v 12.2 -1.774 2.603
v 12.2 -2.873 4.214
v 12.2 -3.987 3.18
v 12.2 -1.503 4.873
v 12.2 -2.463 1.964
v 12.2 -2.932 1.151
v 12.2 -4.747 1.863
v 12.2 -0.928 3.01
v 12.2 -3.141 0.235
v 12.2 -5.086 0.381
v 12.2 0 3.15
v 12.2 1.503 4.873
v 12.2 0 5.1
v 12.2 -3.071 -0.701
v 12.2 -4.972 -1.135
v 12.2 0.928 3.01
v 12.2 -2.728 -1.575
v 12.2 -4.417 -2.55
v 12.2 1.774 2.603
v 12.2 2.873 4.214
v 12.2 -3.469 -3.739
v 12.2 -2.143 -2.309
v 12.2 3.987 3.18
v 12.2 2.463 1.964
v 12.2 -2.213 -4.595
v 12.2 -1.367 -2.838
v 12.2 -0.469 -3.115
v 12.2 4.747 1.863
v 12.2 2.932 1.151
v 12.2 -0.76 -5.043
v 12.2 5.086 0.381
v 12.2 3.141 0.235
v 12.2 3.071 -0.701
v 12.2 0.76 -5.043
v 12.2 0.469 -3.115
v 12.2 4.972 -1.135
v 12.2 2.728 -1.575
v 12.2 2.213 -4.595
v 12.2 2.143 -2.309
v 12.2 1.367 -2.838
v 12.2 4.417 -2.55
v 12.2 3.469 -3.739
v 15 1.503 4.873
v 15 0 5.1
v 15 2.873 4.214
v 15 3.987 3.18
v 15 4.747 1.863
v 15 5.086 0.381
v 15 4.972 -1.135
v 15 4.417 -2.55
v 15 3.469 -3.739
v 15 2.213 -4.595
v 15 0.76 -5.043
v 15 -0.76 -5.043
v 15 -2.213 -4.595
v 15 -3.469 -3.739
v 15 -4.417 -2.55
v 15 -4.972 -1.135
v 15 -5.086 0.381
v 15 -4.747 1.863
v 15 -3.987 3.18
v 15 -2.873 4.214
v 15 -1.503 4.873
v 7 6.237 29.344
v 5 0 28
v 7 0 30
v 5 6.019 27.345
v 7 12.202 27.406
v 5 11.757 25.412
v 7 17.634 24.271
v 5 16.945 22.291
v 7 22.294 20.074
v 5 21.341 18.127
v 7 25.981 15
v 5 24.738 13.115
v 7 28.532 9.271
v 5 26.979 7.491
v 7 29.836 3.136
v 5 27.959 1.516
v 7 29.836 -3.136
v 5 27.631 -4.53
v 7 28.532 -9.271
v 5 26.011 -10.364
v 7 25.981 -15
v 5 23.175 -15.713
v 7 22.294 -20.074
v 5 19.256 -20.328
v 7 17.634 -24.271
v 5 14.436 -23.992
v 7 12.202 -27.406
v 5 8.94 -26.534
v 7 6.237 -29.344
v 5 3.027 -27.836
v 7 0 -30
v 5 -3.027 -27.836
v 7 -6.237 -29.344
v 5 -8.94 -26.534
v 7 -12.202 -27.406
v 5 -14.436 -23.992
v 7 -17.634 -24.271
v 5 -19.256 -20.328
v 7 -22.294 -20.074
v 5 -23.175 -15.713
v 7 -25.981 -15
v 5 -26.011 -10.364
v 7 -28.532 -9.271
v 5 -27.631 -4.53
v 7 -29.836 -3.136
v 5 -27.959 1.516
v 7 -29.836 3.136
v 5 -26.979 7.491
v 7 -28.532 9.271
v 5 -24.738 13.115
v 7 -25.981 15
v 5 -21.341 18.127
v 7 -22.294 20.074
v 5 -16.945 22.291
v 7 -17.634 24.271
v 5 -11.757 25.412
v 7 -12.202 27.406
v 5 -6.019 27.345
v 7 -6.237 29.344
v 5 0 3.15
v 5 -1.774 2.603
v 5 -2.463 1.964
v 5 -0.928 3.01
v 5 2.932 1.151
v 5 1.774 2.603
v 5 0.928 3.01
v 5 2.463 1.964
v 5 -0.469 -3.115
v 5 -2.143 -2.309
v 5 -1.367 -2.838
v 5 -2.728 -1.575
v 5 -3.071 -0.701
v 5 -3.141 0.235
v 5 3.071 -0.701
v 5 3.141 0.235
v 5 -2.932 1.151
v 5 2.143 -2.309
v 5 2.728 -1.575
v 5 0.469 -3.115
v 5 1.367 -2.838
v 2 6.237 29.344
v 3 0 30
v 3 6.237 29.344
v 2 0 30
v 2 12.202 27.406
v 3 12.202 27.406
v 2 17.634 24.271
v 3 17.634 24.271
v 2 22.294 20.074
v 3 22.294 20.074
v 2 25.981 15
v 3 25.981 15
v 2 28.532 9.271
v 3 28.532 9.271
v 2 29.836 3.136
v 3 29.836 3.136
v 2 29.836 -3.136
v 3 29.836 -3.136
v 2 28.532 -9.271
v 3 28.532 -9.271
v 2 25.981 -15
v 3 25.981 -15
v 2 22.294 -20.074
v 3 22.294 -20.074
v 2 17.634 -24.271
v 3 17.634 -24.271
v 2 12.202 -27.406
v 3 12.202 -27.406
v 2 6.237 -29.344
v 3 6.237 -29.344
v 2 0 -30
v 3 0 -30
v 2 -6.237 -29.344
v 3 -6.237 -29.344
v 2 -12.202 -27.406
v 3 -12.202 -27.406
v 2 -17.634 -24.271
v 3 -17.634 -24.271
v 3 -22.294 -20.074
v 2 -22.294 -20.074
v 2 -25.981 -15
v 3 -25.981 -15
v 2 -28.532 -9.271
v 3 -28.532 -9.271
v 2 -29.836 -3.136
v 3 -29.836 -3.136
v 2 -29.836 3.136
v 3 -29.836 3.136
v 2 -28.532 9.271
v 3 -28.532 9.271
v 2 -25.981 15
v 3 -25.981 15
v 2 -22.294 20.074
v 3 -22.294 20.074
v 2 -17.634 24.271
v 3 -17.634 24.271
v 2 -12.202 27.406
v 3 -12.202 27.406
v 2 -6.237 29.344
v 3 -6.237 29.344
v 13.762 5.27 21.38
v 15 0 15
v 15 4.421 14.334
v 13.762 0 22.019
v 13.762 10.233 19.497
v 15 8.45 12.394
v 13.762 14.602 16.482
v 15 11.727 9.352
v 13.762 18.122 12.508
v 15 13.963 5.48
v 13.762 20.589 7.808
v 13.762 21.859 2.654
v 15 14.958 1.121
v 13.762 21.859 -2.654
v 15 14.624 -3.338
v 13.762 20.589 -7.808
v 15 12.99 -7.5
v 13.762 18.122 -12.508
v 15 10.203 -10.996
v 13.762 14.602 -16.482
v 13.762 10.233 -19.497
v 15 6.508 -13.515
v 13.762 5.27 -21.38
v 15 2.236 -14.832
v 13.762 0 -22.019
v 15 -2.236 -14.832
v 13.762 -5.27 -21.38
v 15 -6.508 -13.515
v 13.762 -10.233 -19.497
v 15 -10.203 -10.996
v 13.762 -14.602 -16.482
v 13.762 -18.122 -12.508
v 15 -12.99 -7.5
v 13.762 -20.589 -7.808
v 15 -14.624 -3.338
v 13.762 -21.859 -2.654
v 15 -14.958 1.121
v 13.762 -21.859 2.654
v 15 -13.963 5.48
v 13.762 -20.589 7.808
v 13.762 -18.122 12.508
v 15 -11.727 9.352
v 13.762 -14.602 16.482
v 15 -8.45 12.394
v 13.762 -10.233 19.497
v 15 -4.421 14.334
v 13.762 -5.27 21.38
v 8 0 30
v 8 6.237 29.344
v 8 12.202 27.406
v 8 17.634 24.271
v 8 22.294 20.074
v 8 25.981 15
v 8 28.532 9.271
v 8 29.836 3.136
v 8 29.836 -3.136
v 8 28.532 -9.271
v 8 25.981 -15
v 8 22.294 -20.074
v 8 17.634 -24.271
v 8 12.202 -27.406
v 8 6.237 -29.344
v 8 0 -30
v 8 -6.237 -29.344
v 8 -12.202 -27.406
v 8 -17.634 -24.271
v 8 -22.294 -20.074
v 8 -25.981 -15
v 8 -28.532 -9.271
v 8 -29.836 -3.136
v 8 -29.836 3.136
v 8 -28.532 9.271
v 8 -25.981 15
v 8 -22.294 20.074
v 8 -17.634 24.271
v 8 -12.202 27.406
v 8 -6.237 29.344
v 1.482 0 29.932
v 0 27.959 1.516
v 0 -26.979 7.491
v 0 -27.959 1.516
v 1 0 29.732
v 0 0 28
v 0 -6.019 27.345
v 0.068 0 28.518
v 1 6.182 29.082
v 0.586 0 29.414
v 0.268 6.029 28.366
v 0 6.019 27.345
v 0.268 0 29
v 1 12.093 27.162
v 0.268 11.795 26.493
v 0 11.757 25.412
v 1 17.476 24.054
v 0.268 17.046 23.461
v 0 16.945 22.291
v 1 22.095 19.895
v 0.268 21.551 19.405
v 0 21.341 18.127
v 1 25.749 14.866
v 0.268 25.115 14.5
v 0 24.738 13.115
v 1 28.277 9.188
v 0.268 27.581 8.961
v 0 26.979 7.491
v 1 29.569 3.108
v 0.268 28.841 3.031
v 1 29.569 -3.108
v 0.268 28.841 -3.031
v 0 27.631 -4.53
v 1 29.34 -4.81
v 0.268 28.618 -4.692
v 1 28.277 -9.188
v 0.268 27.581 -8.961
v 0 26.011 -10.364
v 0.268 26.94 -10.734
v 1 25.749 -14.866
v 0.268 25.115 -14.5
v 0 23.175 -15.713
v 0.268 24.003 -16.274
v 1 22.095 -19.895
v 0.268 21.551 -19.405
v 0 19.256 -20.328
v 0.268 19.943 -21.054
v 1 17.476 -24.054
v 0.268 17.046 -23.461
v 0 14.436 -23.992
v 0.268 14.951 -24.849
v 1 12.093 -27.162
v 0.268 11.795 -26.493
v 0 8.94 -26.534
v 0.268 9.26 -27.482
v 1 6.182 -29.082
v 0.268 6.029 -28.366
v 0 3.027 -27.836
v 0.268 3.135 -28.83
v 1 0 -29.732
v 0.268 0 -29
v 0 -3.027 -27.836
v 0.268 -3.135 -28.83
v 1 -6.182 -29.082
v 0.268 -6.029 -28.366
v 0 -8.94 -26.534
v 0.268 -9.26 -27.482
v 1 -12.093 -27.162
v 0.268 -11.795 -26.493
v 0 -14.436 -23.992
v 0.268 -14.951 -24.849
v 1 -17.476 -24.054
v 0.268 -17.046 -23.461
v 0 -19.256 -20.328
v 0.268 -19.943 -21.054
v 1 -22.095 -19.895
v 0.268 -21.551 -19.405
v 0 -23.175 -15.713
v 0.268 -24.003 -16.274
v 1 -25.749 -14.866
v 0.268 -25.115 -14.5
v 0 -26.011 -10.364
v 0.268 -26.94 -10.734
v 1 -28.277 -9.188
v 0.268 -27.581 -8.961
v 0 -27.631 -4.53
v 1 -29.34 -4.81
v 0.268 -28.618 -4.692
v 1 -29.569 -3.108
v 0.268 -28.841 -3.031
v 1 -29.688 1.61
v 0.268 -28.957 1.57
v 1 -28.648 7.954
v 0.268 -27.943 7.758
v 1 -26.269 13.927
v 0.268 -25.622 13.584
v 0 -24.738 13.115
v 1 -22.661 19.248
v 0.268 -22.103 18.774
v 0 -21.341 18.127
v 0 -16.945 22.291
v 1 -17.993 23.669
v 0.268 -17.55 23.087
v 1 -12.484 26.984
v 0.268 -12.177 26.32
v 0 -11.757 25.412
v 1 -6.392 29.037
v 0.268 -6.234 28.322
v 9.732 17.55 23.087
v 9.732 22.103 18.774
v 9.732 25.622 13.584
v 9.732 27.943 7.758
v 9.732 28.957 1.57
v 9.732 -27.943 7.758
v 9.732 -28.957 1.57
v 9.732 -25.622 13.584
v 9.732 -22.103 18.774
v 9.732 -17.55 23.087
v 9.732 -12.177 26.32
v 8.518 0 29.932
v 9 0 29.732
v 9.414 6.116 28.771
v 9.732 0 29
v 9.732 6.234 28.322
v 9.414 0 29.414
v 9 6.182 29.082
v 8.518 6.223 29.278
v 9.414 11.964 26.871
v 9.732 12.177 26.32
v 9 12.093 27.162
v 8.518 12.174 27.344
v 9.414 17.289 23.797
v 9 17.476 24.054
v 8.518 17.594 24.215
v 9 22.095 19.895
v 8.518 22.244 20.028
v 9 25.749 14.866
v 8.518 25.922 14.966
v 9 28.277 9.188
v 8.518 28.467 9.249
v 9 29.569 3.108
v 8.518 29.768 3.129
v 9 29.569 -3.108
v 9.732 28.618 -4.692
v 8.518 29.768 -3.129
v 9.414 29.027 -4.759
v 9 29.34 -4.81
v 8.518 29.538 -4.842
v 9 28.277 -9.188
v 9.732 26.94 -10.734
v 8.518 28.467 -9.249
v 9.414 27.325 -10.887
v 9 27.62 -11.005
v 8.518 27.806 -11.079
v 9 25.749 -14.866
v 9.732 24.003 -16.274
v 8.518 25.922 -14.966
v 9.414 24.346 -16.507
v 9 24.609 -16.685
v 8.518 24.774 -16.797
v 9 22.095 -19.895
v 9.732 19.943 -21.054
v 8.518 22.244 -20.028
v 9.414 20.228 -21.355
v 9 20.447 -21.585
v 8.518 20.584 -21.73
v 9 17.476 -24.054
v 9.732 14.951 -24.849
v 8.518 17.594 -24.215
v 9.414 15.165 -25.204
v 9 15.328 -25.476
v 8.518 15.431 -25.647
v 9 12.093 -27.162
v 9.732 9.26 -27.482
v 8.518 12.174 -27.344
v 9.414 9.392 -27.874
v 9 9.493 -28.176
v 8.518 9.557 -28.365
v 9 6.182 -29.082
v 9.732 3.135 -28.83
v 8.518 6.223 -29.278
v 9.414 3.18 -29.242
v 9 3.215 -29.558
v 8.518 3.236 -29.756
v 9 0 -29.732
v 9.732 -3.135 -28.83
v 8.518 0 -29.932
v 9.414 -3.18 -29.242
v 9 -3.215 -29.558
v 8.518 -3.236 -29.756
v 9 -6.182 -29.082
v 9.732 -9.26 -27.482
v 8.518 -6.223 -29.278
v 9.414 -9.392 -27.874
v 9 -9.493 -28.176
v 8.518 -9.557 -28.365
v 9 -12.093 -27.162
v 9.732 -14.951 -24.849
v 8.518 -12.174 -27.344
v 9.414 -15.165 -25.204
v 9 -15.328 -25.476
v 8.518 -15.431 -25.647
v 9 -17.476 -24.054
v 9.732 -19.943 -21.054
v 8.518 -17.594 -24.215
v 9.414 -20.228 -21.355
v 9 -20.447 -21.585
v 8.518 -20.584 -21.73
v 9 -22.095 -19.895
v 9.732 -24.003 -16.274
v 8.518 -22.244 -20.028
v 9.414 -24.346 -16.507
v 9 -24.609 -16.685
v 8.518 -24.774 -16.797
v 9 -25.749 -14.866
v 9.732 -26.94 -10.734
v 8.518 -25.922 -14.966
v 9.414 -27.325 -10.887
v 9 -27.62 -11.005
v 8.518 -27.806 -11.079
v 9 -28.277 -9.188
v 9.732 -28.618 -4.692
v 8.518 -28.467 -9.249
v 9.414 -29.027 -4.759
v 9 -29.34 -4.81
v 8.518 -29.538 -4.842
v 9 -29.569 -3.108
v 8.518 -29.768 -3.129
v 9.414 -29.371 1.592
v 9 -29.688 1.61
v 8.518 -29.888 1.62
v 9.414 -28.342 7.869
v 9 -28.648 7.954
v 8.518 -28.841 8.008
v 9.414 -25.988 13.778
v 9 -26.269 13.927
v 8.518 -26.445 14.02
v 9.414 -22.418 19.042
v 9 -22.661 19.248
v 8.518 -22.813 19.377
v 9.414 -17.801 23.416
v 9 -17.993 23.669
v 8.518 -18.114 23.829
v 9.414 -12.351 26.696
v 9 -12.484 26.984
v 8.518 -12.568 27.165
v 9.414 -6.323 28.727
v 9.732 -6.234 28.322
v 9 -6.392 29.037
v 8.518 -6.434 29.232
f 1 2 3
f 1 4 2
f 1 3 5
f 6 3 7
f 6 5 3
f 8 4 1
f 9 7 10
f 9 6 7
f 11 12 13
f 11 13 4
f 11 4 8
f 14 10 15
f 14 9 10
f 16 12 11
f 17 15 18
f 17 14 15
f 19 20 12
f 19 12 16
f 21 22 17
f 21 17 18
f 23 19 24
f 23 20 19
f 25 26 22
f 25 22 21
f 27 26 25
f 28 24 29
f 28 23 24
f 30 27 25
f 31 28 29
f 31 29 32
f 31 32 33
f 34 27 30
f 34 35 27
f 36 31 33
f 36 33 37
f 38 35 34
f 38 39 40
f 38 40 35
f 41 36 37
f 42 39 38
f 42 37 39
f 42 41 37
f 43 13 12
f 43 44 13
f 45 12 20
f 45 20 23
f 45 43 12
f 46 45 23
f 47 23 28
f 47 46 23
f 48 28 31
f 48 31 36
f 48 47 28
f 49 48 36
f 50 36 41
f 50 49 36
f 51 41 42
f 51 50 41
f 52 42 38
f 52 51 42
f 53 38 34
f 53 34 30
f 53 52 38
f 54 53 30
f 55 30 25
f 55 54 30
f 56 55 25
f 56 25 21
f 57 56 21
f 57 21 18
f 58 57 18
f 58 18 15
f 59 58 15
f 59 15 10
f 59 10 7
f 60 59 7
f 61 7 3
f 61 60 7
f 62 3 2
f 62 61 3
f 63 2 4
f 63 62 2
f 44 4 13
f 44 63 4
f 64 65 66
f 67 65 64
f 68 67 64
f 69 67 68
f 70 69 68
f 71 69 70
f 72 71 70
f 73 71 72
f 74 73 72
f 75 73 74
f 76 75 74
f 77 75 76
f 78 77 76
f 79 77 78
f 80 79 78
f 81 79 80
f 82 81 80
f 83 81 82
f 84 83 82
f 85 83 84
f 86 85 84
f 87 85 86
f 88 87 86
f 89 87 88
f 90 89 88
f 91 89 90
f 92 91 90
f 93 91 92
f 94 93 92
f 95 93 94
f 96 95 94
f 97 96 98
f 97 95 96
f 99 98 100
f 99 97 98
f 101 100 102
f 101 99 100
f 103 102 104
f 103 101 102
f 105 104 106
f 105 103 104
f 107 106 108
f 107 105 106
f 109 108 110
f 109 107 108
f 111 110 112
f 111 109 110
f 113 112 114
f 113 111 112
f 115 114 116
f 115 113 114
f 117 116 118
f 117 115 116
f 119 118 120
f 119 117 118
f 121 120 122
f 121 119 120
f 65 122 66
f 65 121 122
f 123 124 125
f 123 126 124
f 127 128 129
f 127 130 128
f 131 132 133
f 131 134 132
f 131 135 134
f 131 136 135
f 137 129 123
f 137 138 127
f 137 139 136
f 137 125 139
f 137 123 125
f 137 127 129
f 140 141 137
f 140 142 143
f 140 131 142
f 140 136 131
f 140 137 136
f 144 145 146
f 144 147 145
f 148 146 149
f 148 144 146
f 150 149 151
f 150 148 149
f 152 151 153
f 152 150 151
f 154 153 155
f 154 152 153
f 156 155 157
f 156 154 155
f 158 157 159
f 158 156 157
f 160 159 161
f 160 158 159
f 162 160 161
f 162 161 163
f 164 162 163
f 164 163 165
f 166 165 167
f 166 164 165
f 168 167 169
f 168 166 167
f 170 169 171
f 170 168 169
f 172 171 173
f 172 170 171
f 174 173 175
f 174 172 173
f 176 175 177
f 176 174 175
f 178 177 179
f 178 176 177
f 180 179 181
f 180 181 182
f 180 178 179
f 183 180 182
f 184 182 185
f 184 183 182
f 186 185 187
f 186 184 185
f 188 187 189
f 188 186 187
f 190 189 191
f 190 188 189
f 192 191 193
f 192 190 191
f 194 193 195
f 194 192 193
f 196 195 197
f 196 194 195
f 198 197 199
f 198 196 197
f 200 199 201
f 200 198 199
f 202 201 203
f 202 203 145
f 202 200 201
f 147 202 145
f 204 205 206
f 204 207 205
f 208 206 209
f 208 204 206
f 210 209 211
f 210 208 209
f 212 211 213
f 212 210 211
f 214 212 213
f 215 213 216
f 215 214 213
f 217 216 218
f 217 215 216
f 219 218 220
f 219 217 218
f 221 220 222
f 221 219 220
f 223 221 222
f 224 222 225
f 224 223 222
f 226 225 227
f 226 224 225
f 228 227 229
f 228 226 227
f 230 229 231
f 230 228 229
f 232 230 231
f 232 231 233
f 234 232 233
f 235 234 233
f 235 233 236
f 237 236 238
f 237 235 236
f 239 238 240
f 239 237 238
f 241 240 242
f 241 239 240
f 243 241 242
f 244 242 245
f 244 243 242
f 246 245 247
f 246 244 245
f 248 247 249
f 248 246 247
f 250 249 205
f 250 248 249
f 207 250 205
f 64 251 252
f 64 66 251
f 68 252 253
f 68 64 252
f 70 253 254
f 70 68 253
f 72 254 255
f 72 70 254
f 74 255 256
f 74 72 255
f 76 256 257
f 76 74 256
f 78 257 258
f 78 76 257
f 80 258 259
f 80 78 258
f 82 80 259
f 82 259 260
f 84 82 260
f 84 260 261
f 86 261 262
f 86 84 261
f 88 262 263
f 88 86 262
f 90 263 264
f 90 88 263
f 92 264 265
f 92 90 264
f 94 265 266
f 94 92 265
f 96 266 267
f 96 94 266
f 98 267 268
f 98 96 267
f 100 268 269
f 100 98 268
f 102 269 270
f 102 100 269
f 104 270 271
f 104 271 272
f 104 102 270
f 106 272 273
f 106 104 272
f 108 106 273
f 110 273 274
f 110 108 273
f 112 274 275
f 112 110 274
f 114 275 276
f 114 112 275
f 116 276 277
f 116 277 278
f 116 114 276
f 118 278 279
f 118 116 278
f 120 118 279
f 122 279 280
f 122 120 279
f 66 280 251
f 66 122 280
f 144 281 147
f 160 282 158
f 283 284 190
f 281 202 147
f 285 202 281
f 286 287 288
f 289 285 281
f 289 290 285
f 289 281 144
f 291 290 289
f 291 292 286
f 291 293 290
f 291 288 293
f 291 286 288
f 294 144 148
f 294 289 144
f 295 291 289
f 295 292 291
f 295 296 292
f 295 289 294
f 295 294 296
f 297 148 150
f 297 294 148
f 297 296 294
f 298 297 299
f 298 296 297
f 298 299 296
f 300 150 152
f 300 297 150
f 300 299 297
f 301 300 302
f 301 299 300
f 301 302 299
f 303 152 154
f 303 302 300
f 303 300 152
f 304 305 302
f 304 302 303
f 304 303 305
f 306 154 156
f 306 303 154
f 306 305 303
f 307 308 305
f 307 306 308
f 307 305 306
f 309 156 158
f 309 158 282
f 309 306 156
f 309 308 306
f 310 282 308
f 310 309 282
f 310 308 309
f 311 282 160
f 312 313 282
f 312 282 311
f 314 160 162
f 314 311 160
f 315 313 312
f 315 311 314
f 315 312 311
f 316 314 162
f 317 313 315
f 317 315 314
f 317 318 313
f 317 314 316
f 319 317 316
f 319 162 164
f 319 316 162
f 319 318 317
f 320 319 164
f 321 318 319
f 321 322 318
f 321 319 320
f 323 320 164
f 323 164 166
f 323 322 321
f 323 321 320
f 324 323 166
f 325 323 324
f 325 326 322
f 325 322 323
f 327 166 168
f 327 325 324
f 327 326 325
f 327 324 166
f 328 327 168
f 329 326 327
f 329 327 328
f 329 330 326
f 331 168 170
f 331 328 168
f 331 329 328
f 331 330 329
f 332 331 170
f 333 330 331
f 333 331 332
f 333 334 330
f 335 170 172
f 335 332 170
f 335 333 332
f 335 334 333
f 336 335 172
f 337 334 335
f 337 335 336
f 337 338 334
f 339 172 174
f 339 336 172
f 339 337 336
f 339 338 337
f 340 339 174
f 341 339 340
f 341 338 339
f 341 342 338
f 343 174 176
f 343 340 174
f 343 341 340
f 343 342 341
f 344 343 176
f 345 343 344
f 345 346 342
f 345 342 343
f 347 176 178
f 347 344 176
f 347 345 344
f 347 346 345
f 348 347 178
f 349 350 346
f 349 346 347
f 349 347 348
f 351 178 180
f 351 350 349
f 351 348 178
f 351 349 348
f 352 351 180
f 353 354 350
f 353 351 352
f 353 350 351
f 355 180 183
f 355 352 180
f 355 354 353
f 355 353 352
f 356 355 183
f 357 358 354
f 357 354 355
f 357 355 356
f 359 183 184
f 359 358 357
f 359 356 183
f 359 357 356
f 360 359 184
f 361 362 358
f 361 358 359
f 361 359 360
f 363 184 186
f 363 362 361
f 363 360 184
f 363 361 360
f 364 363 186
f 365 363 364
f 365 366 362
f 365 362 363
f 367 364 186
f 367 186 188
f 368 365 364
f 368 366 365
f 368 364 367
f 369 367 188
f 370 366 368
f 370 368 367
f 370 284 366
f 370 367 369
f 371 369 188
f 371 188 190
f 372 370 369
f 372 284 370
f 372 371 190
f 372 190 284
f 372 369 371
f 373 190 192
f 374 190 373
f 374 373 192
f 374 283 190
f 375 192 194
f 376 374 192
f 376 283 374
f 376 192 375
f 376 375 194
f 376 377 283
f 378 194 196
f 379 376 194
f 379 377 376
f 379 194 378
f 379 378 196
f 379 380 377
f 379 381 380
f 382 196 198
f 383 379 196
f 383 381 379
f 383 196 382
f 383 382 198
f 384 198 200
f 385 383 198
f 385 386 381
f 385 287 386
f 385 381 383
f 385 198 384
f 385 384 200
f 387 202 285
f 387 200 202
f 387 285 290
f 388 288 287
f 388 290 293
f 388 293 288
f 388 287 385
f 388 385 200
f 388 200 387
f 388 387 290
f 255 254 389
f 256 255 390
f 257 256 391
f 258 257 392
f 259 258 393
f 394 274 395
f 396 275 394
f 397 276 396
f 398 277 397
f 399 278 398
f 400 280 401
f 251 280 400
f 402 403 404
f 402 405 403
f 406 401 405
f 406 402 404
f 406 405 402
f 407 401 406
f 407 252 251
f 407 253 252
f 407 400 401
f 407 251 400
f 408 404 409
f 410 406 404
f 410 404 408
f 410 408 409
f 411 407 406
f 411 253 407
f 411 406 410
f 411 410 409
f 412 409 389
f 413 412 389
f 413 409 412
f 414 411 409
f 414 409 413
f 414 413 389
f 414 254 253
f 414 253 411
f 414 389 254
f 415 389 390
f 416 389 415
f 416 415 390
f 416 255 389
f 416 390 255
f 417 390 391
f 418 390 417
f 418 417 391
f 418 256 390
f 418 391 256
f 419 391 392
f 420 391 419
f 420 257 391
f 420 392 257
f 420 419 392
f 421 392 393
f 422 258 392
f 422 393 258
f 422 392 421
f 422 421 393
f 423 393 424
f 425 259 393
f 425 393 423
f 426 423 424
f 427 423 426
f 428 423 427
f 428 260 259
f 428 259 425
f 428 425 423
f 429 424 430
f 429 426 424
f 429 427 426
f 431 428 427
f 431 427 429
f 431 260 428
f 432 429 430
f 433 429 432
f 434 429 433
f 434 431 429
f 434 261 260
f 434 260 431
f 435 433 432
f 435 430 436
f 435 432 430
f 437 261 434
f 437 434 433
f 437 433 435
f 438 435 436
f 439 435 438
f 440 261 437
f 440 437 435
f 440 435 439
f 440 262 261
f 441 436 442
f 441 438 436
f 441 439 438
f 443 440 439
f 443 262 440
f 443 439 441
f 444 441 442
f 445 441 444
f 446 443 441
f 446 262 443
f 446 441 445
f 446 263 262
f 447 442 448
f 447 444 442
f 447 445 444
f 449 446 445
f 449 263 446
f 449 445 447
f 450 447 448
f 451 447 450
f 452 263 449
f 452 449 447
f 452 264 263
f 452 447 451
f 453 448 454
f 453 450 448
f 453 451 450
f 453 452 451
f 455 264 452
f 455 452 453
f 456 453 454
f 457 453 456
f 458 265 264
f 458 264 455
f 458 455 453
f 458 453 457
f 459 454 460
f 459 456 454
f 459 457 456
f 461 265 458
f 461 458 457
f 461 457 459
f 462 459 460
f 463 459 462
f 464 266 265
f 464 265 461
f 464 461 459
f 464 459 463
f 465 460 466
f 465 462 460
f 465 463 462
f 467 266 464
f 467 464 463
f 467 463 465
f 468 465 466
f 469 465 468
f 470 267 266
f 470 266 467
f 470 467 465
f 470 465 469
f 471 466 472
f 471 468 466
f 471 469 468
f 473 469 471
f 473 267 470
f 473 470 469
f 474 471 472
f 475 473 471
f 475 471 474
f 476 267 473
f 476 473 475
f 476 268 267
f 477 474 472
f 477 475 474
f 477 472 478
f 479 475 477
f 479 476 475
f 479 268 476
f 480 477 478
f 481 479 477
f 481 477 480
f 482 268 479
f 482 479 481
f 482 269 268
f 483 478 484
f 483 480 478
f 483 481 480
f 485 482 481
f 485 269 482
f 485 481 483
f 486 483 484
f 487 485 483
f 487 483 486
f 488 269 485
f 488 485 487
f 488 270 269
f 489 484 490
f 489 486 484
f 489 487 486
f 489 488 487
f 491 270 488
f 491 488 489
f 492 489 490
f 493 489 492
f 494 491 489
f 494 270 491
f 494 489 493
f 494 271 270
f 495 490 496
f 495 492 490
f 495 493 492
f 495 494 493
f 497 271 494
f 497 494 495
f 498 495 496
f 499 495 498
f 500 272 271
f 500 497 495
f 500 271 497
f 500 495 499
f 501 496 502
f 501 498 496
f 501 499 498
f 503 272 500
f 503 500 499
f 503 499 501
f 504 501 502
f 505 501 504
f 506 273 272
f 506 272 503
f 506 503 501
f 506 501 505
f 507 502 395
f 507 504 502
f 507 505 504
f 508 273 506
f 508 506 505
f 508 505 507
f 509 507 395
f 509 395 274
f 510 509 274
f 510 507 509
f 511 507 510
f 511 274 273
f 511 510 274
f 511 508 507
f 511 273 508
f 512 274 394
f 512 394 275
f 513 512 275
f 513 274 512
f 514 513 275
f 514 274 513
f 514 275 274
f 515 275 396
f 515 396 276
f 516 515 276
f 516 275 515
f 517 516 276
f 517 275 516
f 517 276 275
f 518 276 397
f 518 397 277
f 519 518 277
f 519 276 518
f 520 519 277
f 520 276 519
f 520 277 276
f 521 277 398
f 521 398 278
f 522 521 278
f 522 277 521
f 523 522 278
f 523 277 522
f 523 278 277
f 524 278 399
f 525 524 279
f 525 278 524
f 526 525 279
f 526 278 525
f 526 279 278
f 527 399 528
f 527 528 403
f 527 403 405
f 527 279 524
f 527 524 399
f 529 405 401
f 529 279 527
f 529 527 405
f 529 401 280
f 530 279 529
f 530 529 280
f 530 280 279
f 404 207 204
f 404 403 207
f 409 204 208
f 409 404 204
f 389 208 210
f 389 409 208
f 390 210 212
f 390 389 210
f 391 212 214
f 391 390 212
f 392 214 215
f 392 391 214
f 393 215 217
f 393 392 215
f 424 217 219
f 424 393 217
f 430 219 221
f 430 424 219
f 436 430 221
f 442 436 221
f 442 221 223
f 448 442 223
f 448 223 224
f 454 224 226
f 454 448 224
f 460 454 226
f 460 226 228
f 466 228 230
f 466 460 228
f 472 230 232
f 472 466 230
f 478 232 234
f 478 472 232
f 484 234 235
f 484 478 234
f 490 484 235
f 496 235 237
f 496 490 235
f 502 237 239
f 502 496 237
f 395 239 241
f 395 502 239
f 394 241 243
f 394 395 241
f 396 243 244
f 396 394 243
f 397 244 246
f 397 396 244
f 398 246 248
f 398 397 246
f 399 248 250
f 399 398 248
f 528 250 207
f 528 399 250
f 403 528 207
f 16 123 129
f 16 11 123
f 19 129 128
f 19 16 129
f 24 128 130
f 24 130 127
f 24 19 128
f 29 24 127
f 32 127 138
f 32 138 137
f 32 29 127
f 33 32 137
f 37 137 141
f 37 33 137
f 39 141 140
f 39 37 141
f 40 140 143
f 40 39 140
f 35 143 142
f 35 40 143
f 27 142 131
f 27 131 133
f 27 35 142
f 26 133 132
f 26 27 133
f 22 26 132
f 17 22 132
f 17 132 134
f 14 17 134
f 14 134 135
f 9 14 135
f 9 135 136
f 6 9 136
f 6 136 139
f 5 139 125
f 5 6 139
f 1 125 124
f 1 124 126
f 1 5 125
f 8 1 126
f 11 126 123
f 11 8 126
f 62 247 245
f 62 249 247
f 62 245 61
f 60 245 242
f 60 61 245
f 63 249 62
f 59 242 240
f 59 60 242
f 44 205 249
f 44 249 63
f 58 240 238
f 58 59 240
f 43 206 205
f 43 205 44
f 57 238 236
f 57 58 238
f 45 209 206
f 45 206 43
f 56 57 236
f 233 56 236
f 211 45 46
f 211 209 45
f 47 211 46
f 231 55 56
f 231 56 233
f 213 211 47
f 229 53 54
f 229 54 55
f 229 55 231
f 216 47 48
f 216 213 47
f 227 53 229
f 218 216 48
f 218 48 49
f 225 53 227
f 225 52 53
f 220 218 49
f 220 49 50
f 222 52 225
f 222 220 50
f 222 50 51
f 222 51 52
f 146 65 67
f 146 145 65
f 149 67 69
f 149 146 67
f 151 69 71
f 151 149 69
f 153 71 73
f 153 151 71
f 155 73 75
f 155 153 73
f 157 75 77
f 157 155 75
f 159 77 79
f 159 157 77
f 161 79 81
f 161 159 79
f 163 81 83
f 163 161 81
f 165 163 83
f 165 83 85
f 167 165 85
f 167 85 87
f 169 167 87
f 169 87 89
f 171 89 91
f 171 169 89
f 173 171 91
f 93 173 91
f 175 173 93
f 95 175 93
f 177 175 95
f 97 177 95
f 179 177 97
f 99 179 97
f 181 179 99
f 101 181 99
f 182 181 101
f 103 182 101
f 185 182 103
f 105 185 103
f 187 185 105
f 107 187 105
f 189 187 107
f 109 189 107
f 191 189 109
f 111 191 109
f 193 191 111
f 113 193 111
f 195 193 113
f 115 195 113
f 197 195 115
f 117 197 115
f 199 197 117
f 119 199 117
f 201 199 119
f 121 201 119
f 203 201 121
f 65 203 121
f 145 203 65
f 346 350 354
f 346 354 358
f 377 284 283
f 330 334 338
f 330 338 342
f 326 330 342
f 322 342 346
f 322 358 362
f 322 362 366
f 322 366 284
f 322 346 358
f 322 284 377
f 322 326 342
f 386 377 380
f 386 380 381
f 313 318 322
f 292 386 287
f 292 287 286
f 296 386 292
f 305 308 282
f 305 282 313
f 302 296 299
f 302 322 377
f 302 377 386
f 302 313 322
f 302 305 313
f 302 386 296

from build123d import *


with BuildPart() as f1:
    # F0 (on Front) → F1 (revolve)
    with BuildSketch(Plane.XZ):
        with BuildLine():
            Line((0, 28), (0, 0))
            Line((0, 0), (5, 0))
            Line((5, 0), (5, 3.15))
            Line((5, 3.15), (12.2, 3.15))
            Line((12.2, 3.15), (12.2, 5.1))
            Line((12.2, 5.1), (15, 5.1))
            Line((15, 5.1), (15, 15))
            Line((15, 15), (13.762285, 22.019429))
            Line((13.762285, 22.019429), (9.732051, 29))
            ThreePointArc((9.732051, 29), (9, 29.732051), (8, 30))
            Line((8, 30), (7, 30))
            Line((7, 30), (5, 28))
            Line((5, 28), (3, 30))
            Line((3, 30), (2, 30))
            ThreePointArc((2, 30), (0.585786, 29.414214), (0, 28))
        make_face()
    revolve(axis=Axis((2.5, 0, 0), (-1, 0, 0)))


solid = f1.part
